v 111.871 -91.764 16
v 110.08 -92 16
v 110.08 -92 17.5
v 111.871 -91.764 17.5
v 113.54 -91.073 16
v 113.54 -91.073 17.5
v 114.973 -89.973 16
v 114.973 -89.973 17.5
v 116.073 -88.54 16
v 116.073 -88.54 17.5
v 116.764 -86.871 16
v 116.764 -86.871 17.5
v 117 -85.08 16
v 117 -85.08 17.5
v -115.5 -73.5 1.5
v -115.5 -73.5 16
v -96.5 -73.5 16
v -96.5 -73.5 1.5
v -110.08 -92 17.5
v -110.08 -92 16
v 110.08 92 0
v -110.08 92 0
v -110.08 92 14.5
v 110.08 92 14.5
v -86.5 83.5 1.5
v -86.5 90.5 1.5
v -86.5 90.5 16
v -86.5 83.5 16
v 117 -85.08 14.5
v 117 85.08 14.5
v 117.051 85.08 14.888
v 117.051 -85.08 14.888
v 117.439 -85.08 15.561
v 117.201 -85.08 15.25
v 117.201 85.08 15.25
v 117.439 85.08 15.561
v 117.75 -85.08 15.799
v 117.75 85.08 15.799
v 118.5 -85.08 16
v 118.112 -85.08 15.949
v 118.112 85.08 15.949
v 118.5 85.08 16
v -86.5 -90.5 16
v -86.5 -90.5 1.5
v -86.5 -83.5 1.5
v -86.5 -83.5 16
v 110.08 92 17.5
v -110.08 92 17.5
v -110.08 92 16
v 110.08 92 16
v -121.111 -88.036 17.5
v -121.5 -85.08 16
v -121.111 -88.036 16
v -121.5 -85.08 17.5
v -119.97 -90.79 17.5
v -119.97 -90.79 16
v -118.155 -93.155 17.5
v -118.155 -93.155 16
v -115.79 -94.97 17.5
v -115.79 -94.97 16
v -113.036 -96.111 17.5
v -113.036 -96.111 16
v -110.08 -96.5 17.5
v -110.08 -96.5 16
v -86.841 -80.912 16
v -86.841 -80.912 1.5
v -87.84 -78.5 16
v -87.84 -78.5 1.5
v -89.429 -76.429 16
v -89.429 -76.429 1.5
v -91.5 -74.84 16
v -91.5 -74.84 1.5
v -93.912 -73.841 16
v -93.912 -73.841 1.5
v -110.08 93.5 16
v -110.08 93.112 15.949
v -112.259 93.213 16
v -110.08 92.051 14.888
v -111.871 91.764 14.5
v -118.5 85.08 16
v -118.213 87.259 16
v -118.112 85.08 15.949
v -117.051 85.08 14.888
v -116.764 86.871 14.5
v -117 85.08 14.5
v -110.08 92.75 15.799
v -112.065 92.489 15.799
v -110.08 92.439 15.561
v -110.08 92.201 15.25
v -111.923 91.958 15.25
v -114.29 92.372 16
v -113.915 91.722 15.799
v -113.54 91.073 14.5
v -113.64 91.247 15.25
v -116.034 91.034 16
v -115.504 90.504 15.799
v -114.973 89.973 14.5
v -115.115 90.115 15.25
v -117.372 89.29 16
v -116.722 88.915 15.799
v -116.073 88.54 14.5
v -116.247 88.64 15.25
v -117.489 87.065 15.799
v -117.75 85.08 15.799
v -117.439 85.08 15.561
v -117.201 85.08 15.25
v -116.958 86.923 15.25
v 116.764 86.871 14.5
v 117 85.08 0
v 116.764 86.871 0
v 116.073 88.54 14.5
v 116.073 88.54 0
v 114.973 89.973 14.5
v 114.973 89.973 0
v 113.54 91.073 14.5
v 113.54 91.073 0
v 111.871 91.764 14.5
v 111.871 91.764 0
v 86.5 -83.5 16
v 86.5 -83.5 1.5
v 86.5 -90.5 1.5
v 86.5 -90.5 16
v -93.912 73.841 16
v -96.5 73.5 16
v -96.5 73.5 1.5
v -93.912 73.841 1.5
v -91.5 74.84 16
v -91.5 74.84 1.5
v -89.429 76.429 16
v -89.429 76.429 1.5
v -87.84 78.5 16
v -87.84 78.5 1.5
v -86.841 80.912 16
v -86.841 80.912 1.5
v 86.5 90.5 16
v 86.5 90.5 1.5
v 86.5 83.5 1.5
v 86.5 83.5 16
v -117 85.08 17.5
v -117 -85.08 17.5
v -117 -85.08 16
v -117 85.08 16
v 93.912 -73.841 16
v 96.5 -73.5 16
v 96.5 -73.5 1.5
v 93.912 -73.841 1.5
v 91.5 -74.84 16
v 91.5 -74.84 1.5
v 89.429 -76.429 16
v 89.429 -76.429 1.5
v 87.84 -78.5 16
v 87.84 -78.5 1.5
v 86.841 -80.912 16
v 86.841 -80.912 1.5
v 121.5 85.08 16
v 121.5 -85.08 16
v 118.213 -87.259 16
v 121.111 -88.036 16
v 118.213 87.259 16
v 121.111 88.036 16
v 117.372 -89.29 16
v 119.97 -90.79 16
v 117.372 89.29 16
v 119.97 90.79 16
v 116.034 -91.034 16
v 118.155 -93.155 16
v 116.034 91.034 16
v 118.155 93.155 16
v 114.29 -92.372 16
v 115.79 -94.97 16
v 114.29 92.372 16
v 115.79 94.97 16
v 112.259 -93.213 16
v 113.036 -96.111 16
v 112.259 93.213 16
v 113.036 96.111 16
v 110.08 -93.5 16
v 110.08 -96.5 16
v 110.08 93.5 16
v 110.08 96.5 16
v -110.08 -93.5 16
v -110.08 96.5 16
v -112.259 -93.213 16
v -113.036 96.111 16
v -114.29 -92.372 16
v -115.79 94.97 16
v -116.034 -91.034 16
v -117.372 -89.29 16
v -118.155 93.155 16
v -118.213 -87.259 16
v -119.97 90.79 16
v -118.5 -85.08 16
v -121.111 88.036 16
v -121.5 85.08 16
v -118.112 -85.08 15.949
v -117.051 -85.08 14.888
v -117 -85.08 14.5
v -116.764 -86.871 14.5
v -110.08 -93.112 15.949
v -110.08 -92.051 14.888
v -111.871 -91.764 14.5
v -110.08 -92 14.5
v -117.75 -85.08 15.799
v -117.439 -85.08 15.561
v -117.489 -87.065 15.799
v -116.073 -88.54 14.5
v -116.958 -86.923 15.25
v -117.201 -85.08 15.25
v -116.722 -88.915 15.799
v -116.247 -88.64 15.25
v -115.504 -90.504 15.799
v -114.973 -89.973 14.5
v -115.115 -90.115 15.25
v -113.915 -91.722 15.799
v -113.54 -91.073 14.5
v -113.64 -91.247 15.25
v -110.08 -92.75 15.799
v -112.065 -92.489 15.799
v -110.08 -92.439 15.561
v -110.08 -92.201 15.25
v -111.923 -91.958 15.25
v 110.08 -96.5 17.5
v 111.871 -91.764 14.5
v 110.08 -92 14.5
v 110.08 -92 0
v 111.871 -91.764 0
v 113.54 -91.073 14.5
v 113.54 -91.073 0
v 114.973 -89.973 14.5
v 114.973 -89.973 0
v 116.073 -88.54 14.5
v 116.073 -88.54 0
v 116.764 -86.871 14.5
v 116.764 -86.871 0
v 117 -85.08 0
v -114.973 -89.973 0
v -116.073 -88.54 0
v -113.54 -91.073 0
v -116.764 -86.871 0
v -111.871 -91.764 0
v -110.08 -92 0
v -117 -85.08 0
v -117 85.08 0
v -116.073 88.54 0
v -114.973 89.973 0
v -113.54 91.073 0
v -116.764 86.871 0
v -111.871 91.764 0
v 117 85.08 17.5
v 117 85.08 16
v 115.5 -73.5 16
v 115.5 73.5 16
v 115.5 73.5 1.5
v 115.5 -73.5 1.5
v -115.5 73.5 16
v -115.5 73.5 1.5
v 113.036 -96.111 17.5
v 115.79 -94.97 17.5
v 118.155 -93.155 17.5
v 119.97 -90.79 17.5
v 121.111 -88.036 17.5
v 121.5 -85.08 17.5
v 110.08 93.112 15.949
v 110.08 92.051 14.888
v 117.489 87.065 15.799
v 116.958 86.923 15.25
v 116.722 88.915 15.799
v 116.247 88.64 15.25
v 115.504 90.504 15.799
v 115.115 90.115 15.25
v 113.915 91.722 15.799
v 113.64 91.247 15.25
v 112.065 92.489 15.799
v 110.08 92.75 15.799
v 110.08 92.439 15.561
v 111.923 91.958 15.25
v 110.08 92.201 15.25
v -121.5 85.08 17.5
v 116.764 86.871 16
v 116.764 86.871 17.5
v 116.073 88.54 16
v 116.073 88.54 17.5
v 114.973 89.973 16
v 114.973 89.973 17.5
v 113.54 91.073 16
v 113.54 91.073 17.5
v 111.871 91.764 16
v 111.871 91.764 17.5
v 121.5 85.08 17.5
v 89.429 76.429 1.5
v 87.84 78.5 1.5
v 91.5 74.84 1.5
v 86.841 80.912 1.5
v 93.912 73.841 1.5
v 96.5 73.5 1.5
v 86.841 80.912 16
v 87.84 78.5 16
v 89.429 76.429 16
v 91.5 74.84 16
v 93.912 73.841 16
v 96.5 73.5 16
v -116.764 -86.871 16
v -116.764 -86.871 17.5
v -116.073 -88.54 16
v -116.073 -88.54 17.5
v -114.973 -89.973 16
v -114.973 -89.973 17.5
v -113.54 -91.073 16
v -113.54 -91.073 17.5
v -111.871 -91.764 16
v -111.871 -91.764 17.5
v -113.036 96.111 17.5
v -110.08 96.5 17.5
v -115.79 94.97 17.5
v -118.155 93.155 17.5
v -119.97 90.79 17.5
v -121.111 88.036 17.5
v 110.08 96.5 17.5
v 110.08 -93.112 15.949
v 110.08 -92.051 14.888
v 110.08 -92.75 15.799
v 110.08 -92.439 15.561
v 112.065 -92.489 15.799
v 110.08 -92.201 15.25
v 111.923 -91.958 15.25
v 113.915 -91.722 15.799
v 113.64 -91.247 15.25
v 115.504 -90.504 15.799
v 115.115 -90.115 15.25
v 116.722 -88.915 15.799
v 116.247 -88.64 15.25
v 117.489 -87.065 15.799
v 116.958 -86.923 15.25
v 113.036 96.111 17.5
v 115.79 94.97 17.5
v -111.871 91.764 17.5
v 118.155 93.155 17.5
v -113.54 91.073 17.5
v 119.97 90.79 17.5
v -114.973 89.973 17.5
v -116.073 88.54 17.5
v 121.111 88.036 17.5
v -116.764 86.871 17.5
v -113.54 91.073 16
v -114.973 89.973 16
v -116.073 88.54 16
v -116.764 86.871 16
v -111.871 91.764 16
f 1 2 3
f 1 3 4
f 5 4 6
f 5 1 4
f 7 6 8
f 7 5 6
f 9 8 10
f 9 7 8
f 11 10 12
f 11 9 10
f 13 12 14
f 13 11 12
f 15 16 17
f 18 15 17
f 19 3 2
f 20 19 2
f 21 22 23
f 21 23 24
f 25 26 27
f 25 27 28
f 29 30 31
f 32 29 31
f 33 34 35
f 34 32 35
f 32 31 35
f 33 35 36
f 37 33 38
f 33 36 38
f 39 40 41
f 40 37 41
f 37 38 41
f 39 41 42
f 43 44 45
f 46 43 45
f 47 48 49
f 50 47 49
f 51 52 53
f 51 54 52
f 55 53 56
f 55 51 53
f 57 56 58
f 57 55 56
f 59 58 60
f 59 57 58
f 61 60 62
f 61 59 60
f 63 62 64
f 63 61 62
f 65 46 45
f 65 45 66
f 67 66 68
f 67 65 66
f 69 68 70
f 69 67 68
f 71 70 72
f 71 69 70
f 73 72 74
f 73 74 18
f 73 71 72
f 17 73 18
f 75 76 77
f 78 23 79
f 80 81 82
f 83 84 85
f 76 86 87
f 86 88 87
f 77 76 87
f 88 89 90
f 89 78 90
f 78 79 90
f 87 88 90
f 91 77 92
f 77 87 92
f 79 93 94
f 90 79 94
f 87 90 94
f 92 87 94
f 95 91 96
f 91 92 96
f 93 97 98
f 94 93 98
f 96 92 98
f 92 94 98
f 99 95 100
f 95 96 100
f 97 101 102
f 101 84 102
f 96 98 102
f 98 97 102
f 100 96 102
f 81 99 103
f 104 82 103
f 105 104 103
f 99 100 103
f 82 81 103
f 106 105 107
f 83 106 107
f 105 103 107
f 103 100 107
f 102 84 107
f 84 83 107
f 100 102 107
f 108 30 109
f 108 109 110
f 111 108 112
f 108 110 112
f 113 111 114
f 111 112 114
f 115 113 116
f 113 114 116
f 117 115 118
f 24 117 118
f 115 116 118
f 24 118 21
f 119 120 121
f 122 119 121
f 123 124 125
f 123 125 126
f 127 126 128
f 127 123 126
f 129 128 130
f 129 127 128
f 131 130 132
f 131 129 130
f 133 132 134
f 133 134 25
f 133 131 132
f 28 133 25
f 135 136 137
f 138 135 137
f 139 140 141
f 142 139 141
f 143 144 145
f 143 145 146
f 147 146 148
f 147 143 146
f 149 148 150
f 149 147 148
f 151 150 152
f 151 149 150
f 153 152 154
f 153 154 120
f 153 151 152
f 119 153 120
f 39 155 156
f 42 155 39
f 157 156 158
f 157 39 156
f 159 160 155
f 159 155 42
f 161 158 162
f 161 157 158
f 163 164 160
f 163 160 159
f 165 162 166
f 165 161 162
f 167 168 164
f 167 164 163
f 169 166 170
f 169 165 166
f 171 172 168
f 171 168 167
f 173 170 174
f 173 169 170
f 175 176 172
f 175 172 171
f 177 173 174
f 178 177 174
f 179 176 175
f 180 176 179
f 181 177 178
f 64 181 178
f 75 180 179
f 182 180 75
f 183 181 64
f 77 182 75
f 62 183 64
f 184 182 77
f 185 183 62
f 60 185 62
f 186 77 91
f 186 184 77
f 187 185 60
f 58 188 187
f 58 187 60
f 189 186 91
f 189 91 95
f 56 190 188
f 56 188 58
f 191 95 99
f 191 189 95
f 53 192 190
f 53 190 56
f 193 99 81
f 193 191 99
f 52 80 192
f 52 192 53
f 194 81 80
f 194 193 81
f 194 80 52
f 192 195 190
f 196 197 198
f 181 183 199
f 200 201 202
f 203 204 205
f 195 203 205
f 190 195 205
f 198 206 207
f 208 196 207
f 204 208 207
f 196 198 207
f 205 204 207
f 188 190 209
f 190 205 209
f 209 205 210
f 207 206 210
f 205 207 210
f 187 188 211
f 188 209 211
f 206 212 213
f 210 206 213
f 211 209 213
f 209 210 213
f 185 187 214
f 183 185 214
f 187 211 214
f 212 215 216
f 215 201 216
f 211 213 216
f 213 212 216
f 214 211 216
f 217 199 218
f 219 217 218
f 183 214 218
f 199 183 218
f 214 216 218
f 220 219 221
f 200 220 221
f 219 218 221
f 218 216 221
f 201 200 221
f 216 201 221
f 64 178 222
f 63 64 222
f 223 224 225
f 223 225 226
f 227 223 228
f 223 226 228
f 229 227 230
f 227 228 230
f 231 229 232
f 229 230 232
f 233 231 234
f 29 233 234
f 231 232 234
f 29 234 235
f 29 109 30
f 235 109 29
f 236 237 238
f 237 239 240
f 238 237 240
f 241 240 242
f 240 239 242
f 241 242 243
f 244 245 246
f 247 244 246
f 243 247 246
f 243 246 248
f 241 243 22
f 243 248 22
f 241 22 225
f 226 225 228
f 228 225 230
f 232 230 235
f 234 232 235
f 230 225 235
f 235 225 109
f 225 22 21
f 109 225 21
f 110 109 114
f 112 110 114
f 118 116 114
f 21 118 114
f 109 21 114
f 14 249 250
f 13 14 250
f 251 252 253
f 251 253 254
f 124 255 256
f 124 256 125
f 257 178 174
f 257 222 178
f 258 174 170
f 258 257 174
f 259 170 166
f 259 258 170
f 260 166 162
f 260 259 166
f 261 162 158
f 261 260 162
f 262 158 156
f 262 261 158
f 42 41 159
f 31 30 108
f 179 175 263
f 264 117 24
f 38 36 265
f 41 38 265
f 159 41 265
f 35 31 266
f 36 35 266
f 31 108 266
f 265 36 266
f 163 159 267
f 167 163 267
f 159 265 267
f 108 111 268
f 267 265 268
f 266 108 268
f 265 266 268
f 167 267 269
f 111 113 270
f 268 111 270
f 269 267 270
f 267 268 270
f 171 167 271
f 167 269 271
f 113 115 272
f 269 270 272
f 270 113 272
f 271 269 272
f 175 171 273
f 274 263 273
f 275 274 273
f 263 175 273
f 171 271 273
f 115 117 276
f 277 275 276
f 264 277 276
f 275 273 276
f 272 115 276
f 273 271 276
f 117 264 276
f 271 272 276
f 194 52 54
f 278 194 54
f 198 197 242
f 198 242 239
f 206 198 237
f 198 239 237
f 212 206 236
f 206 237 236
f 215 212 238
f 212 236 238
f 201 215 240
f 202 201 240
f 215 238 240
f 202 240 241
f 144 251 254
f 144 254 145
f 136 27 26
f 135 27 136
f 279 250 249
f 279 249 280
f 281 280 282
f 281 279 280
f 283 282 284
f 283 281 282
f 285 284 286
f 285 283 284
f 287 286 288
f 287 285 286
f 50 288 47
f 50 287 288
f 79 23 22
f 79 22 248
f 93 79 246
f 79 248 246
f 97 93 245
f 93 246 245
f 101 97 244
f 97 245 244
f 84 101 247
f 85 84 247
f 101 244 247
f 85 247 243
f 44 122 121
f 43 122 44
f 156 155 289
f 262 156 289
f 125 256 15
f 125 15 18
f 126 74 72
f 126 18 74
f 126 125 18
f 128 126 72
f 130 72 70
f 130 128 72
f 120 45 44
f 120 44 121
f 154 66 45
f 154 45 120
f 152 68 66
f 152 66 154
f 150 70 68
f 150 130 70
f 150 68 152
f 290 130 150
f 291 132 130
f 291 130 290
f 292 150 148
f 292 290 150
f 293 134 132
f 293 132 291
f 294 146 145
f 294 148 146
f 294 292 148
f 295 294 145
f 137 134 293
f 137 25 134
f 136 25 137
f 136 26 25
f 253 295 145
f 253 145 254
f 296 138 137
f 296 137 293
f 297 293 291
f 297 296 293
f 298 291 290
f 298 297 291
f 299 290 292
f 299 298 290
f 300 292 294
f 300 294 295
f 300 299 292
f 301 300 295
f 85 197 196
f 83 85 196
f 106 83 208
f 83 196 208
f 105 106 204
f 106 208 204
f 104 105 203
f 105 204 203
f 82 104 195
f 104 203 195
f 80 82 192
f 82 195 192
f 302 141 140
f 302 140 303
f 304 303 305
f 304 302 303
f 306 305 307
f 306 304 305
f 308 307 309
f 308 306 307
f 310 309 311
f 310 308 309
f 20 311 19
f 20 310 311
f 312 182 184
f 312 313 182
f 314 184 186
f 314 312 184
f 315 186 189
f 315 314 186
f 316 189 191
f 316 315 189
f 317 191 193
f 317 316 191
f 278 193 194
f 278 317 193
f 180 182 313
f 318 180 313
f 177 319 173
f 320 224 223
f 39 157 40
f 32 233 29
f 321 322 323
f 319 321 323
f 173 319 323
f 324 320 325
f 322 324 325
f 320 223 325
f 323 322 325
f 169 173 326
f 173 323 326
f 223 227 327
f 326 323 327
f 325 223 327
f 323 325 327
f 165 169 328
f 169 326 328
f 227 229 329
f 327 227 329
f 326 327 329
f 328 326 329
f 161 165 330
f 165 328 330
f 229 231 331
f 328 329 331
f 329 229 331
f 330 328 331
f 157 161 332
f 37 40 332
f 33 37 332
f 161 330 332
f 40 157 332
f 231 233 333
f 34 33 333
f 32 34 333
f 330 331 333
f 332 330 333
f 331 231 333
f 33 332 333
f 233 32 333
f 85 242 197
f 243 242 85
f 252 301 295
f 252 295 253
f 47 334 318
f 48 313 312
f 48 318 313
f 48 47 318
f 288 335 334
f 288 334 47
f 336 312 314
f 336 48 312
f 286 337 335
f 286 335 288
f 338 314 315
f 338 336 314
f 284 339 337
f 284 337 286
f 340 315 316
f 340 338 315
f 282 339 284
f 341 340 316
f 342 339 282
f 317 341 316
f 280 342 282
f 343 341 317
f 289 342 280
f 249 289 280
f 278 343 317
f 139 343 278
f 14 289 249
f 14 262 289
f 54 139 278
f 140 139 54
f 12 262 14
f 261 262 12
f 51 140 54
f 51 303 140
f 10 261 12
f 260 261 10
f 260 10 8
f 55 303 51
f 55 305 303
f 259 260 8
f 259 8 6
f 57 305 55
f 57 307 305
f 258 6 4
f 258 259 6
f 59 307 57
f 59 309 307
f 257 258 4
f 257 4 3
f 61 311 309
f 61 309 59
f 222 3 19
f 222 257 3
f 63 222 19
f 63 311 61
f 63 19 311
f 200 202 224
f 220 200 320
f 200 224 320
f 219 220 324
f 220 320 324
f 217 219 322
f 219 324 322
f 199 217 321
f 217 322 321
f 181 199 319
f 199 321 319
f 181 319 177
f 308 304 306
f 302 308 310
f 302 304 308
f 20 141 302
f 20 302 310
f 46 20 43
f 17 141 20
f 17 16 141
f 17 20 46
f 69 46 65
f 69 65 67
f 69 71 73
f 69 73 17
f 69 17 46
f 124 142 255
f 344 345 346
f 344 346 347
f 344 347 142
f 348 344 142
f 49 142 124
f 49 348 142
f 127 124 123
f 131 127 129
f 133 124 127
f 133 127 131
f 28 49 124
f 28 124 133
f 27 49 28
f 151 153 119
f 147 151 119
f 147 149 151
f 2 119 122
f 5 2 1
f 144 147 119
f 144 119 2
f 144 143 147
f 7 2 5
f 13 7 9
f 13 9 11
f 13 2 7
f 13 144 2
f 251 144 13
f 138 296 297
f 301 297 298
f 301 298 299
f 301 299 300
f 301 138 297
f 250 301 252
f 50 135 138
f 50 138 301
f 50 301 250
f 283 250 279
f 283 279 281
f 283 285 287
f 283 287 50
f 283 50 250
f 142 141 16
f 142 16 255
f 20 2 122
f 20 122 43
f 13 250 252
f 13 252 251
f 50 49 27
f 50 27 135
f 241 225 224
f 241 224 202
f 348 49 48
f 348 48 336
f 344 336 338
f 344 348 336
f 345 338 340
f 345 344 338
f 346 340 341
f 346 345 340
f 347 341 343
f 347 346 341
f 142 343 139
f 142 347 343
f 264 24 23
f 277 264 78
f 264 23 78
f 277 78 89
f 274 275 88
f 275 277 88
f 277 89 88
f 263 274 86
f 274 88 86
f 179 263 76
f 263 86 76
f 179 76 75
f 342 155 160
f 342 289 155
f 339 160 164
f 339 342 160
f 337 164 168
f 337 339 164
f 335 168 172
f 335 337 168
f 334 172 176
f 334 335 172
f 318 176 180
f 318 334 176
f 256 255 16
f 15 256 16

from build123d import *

# Parameters (mm, degrees)
PAD003_DEPTH    = 16
POCKET002_DEPTH = 14.5


with BuildPart() as part:
    # Sketch006 → Pad003 (new body)
    with BuildSketch(Plane.XY):
        with BuildLine():
            ThreePointArc((-110.08, 92), (-114.973179, 89.973179), (-117, 85.08))
            Line((-117, -85.08), (-117, 85.08))
            ThreePointArc((-117, -85.08), (-114.973179, -89.973179), (-110.08, -92))
            Line((110.08, -92), (-110.08, -92))
            ThreePointArc((110.08, -92), (114.973179, -89.973179), (117, -85.08))
            Line((117, 85.08), (117, -85.08))
            ThreePointArc((117, 85.08), (114.973179, 89.973179), (110.08, 92))
            Line((-110.08, 92), (110.08, 92))
        make_face()
    extrude(amount=PAD003_DEPTH)

    # Sketch007 → Pocket002 (cut)
    with BuildSketch(Plane.XY.offset(16)):
        with BuildLine():
            Line((-115.5, 73.5), (-115.5, -73.5))
            Line((-115.5, -73.5), (-96.5, -73.5))
            ThreePointArc((-86.5, -83.5), (-89.428932, -76.428932), (-96.5, -73.5))
            Line((-86.5, -90.5), (-86.5, -83.5))
            Line((86.5, -90.5), (-86.5, -90.5))
            Line((86.5, -83.5), (86.5, -90.5))
            ThreePointArc((96.5, -73.5), (89.428932, -76.428932), (86.5, -83.5))
            Line((115.5, -73.5), (96.5, -73.5))
            Line((115.5, 73.5), (115.5, -73.5))
            Line((96.5, 73.5), (115.5, 73.5))
            ThreePointArc((86.5, 83.5), (89.428932, 76.428932), (96.5, 73.5))
            Line((86.5, 90.5), (86.5, 83.5))
            Line((-86.5, 90.5), (86.5, 90.5))
            Line((-86.5, 90.5), (-86.5, 83.5))
            ThreePointArc((-96.5, 73.5), (-89.428932, 76.428932), (-86.5, 83.5))
            Line((-115.5, 73.5), (-96.5, 73.5))
        make_face()
    extrude(amount=-POCKET002_DEPTH, mode=Mode.SUBTRACT)

    # AdditivePipe001: sweep along a path in Sketch009
    with BuildLine(Plane.XY.offset(16)) as additivepipe001_path:
        ThreePointArc((-110.08, 92), (-114.973179, 89.973179), (-117, 85.08))
        Line((-117, 85.08), (-117, -85.08))
        ThreePointArc((-117, -85.08), (-114.973179, -89.973179), (-110.08, -92))
        Line((-110.08, -92), (110.08, -92))
        ThreePointArc((110.08, -92), (114.973179, -89.973179), (117, -85.08))
        Line((117, -85.08), (117, 85.08))
        ThreePointArc((117, 85.08), (114.973179, 89.973179), (110.08, 92))
        Line((110.08, 92), (-110.08, 92))
    # Sketch008 → AdditivePipe001 (sweep)
    with BuildSketch(Plane.XZ):
        with BuildLine():
            Line((117, 14.5), (117, 16))
            Line((117, 17.5), (117, 16))
            Line((121.5, 17.5), (117, 17.5))
            Line((121.5, 16), (121.5, 17.5))
            Line((118.5, 16), (121.5, 16))
            ThreePointArc((118.5, 16), (117.43934, 15.56066), (117, 14.5))
        make_face()
    sweep(path=additivepipe001_path.line)


solid = part.part
